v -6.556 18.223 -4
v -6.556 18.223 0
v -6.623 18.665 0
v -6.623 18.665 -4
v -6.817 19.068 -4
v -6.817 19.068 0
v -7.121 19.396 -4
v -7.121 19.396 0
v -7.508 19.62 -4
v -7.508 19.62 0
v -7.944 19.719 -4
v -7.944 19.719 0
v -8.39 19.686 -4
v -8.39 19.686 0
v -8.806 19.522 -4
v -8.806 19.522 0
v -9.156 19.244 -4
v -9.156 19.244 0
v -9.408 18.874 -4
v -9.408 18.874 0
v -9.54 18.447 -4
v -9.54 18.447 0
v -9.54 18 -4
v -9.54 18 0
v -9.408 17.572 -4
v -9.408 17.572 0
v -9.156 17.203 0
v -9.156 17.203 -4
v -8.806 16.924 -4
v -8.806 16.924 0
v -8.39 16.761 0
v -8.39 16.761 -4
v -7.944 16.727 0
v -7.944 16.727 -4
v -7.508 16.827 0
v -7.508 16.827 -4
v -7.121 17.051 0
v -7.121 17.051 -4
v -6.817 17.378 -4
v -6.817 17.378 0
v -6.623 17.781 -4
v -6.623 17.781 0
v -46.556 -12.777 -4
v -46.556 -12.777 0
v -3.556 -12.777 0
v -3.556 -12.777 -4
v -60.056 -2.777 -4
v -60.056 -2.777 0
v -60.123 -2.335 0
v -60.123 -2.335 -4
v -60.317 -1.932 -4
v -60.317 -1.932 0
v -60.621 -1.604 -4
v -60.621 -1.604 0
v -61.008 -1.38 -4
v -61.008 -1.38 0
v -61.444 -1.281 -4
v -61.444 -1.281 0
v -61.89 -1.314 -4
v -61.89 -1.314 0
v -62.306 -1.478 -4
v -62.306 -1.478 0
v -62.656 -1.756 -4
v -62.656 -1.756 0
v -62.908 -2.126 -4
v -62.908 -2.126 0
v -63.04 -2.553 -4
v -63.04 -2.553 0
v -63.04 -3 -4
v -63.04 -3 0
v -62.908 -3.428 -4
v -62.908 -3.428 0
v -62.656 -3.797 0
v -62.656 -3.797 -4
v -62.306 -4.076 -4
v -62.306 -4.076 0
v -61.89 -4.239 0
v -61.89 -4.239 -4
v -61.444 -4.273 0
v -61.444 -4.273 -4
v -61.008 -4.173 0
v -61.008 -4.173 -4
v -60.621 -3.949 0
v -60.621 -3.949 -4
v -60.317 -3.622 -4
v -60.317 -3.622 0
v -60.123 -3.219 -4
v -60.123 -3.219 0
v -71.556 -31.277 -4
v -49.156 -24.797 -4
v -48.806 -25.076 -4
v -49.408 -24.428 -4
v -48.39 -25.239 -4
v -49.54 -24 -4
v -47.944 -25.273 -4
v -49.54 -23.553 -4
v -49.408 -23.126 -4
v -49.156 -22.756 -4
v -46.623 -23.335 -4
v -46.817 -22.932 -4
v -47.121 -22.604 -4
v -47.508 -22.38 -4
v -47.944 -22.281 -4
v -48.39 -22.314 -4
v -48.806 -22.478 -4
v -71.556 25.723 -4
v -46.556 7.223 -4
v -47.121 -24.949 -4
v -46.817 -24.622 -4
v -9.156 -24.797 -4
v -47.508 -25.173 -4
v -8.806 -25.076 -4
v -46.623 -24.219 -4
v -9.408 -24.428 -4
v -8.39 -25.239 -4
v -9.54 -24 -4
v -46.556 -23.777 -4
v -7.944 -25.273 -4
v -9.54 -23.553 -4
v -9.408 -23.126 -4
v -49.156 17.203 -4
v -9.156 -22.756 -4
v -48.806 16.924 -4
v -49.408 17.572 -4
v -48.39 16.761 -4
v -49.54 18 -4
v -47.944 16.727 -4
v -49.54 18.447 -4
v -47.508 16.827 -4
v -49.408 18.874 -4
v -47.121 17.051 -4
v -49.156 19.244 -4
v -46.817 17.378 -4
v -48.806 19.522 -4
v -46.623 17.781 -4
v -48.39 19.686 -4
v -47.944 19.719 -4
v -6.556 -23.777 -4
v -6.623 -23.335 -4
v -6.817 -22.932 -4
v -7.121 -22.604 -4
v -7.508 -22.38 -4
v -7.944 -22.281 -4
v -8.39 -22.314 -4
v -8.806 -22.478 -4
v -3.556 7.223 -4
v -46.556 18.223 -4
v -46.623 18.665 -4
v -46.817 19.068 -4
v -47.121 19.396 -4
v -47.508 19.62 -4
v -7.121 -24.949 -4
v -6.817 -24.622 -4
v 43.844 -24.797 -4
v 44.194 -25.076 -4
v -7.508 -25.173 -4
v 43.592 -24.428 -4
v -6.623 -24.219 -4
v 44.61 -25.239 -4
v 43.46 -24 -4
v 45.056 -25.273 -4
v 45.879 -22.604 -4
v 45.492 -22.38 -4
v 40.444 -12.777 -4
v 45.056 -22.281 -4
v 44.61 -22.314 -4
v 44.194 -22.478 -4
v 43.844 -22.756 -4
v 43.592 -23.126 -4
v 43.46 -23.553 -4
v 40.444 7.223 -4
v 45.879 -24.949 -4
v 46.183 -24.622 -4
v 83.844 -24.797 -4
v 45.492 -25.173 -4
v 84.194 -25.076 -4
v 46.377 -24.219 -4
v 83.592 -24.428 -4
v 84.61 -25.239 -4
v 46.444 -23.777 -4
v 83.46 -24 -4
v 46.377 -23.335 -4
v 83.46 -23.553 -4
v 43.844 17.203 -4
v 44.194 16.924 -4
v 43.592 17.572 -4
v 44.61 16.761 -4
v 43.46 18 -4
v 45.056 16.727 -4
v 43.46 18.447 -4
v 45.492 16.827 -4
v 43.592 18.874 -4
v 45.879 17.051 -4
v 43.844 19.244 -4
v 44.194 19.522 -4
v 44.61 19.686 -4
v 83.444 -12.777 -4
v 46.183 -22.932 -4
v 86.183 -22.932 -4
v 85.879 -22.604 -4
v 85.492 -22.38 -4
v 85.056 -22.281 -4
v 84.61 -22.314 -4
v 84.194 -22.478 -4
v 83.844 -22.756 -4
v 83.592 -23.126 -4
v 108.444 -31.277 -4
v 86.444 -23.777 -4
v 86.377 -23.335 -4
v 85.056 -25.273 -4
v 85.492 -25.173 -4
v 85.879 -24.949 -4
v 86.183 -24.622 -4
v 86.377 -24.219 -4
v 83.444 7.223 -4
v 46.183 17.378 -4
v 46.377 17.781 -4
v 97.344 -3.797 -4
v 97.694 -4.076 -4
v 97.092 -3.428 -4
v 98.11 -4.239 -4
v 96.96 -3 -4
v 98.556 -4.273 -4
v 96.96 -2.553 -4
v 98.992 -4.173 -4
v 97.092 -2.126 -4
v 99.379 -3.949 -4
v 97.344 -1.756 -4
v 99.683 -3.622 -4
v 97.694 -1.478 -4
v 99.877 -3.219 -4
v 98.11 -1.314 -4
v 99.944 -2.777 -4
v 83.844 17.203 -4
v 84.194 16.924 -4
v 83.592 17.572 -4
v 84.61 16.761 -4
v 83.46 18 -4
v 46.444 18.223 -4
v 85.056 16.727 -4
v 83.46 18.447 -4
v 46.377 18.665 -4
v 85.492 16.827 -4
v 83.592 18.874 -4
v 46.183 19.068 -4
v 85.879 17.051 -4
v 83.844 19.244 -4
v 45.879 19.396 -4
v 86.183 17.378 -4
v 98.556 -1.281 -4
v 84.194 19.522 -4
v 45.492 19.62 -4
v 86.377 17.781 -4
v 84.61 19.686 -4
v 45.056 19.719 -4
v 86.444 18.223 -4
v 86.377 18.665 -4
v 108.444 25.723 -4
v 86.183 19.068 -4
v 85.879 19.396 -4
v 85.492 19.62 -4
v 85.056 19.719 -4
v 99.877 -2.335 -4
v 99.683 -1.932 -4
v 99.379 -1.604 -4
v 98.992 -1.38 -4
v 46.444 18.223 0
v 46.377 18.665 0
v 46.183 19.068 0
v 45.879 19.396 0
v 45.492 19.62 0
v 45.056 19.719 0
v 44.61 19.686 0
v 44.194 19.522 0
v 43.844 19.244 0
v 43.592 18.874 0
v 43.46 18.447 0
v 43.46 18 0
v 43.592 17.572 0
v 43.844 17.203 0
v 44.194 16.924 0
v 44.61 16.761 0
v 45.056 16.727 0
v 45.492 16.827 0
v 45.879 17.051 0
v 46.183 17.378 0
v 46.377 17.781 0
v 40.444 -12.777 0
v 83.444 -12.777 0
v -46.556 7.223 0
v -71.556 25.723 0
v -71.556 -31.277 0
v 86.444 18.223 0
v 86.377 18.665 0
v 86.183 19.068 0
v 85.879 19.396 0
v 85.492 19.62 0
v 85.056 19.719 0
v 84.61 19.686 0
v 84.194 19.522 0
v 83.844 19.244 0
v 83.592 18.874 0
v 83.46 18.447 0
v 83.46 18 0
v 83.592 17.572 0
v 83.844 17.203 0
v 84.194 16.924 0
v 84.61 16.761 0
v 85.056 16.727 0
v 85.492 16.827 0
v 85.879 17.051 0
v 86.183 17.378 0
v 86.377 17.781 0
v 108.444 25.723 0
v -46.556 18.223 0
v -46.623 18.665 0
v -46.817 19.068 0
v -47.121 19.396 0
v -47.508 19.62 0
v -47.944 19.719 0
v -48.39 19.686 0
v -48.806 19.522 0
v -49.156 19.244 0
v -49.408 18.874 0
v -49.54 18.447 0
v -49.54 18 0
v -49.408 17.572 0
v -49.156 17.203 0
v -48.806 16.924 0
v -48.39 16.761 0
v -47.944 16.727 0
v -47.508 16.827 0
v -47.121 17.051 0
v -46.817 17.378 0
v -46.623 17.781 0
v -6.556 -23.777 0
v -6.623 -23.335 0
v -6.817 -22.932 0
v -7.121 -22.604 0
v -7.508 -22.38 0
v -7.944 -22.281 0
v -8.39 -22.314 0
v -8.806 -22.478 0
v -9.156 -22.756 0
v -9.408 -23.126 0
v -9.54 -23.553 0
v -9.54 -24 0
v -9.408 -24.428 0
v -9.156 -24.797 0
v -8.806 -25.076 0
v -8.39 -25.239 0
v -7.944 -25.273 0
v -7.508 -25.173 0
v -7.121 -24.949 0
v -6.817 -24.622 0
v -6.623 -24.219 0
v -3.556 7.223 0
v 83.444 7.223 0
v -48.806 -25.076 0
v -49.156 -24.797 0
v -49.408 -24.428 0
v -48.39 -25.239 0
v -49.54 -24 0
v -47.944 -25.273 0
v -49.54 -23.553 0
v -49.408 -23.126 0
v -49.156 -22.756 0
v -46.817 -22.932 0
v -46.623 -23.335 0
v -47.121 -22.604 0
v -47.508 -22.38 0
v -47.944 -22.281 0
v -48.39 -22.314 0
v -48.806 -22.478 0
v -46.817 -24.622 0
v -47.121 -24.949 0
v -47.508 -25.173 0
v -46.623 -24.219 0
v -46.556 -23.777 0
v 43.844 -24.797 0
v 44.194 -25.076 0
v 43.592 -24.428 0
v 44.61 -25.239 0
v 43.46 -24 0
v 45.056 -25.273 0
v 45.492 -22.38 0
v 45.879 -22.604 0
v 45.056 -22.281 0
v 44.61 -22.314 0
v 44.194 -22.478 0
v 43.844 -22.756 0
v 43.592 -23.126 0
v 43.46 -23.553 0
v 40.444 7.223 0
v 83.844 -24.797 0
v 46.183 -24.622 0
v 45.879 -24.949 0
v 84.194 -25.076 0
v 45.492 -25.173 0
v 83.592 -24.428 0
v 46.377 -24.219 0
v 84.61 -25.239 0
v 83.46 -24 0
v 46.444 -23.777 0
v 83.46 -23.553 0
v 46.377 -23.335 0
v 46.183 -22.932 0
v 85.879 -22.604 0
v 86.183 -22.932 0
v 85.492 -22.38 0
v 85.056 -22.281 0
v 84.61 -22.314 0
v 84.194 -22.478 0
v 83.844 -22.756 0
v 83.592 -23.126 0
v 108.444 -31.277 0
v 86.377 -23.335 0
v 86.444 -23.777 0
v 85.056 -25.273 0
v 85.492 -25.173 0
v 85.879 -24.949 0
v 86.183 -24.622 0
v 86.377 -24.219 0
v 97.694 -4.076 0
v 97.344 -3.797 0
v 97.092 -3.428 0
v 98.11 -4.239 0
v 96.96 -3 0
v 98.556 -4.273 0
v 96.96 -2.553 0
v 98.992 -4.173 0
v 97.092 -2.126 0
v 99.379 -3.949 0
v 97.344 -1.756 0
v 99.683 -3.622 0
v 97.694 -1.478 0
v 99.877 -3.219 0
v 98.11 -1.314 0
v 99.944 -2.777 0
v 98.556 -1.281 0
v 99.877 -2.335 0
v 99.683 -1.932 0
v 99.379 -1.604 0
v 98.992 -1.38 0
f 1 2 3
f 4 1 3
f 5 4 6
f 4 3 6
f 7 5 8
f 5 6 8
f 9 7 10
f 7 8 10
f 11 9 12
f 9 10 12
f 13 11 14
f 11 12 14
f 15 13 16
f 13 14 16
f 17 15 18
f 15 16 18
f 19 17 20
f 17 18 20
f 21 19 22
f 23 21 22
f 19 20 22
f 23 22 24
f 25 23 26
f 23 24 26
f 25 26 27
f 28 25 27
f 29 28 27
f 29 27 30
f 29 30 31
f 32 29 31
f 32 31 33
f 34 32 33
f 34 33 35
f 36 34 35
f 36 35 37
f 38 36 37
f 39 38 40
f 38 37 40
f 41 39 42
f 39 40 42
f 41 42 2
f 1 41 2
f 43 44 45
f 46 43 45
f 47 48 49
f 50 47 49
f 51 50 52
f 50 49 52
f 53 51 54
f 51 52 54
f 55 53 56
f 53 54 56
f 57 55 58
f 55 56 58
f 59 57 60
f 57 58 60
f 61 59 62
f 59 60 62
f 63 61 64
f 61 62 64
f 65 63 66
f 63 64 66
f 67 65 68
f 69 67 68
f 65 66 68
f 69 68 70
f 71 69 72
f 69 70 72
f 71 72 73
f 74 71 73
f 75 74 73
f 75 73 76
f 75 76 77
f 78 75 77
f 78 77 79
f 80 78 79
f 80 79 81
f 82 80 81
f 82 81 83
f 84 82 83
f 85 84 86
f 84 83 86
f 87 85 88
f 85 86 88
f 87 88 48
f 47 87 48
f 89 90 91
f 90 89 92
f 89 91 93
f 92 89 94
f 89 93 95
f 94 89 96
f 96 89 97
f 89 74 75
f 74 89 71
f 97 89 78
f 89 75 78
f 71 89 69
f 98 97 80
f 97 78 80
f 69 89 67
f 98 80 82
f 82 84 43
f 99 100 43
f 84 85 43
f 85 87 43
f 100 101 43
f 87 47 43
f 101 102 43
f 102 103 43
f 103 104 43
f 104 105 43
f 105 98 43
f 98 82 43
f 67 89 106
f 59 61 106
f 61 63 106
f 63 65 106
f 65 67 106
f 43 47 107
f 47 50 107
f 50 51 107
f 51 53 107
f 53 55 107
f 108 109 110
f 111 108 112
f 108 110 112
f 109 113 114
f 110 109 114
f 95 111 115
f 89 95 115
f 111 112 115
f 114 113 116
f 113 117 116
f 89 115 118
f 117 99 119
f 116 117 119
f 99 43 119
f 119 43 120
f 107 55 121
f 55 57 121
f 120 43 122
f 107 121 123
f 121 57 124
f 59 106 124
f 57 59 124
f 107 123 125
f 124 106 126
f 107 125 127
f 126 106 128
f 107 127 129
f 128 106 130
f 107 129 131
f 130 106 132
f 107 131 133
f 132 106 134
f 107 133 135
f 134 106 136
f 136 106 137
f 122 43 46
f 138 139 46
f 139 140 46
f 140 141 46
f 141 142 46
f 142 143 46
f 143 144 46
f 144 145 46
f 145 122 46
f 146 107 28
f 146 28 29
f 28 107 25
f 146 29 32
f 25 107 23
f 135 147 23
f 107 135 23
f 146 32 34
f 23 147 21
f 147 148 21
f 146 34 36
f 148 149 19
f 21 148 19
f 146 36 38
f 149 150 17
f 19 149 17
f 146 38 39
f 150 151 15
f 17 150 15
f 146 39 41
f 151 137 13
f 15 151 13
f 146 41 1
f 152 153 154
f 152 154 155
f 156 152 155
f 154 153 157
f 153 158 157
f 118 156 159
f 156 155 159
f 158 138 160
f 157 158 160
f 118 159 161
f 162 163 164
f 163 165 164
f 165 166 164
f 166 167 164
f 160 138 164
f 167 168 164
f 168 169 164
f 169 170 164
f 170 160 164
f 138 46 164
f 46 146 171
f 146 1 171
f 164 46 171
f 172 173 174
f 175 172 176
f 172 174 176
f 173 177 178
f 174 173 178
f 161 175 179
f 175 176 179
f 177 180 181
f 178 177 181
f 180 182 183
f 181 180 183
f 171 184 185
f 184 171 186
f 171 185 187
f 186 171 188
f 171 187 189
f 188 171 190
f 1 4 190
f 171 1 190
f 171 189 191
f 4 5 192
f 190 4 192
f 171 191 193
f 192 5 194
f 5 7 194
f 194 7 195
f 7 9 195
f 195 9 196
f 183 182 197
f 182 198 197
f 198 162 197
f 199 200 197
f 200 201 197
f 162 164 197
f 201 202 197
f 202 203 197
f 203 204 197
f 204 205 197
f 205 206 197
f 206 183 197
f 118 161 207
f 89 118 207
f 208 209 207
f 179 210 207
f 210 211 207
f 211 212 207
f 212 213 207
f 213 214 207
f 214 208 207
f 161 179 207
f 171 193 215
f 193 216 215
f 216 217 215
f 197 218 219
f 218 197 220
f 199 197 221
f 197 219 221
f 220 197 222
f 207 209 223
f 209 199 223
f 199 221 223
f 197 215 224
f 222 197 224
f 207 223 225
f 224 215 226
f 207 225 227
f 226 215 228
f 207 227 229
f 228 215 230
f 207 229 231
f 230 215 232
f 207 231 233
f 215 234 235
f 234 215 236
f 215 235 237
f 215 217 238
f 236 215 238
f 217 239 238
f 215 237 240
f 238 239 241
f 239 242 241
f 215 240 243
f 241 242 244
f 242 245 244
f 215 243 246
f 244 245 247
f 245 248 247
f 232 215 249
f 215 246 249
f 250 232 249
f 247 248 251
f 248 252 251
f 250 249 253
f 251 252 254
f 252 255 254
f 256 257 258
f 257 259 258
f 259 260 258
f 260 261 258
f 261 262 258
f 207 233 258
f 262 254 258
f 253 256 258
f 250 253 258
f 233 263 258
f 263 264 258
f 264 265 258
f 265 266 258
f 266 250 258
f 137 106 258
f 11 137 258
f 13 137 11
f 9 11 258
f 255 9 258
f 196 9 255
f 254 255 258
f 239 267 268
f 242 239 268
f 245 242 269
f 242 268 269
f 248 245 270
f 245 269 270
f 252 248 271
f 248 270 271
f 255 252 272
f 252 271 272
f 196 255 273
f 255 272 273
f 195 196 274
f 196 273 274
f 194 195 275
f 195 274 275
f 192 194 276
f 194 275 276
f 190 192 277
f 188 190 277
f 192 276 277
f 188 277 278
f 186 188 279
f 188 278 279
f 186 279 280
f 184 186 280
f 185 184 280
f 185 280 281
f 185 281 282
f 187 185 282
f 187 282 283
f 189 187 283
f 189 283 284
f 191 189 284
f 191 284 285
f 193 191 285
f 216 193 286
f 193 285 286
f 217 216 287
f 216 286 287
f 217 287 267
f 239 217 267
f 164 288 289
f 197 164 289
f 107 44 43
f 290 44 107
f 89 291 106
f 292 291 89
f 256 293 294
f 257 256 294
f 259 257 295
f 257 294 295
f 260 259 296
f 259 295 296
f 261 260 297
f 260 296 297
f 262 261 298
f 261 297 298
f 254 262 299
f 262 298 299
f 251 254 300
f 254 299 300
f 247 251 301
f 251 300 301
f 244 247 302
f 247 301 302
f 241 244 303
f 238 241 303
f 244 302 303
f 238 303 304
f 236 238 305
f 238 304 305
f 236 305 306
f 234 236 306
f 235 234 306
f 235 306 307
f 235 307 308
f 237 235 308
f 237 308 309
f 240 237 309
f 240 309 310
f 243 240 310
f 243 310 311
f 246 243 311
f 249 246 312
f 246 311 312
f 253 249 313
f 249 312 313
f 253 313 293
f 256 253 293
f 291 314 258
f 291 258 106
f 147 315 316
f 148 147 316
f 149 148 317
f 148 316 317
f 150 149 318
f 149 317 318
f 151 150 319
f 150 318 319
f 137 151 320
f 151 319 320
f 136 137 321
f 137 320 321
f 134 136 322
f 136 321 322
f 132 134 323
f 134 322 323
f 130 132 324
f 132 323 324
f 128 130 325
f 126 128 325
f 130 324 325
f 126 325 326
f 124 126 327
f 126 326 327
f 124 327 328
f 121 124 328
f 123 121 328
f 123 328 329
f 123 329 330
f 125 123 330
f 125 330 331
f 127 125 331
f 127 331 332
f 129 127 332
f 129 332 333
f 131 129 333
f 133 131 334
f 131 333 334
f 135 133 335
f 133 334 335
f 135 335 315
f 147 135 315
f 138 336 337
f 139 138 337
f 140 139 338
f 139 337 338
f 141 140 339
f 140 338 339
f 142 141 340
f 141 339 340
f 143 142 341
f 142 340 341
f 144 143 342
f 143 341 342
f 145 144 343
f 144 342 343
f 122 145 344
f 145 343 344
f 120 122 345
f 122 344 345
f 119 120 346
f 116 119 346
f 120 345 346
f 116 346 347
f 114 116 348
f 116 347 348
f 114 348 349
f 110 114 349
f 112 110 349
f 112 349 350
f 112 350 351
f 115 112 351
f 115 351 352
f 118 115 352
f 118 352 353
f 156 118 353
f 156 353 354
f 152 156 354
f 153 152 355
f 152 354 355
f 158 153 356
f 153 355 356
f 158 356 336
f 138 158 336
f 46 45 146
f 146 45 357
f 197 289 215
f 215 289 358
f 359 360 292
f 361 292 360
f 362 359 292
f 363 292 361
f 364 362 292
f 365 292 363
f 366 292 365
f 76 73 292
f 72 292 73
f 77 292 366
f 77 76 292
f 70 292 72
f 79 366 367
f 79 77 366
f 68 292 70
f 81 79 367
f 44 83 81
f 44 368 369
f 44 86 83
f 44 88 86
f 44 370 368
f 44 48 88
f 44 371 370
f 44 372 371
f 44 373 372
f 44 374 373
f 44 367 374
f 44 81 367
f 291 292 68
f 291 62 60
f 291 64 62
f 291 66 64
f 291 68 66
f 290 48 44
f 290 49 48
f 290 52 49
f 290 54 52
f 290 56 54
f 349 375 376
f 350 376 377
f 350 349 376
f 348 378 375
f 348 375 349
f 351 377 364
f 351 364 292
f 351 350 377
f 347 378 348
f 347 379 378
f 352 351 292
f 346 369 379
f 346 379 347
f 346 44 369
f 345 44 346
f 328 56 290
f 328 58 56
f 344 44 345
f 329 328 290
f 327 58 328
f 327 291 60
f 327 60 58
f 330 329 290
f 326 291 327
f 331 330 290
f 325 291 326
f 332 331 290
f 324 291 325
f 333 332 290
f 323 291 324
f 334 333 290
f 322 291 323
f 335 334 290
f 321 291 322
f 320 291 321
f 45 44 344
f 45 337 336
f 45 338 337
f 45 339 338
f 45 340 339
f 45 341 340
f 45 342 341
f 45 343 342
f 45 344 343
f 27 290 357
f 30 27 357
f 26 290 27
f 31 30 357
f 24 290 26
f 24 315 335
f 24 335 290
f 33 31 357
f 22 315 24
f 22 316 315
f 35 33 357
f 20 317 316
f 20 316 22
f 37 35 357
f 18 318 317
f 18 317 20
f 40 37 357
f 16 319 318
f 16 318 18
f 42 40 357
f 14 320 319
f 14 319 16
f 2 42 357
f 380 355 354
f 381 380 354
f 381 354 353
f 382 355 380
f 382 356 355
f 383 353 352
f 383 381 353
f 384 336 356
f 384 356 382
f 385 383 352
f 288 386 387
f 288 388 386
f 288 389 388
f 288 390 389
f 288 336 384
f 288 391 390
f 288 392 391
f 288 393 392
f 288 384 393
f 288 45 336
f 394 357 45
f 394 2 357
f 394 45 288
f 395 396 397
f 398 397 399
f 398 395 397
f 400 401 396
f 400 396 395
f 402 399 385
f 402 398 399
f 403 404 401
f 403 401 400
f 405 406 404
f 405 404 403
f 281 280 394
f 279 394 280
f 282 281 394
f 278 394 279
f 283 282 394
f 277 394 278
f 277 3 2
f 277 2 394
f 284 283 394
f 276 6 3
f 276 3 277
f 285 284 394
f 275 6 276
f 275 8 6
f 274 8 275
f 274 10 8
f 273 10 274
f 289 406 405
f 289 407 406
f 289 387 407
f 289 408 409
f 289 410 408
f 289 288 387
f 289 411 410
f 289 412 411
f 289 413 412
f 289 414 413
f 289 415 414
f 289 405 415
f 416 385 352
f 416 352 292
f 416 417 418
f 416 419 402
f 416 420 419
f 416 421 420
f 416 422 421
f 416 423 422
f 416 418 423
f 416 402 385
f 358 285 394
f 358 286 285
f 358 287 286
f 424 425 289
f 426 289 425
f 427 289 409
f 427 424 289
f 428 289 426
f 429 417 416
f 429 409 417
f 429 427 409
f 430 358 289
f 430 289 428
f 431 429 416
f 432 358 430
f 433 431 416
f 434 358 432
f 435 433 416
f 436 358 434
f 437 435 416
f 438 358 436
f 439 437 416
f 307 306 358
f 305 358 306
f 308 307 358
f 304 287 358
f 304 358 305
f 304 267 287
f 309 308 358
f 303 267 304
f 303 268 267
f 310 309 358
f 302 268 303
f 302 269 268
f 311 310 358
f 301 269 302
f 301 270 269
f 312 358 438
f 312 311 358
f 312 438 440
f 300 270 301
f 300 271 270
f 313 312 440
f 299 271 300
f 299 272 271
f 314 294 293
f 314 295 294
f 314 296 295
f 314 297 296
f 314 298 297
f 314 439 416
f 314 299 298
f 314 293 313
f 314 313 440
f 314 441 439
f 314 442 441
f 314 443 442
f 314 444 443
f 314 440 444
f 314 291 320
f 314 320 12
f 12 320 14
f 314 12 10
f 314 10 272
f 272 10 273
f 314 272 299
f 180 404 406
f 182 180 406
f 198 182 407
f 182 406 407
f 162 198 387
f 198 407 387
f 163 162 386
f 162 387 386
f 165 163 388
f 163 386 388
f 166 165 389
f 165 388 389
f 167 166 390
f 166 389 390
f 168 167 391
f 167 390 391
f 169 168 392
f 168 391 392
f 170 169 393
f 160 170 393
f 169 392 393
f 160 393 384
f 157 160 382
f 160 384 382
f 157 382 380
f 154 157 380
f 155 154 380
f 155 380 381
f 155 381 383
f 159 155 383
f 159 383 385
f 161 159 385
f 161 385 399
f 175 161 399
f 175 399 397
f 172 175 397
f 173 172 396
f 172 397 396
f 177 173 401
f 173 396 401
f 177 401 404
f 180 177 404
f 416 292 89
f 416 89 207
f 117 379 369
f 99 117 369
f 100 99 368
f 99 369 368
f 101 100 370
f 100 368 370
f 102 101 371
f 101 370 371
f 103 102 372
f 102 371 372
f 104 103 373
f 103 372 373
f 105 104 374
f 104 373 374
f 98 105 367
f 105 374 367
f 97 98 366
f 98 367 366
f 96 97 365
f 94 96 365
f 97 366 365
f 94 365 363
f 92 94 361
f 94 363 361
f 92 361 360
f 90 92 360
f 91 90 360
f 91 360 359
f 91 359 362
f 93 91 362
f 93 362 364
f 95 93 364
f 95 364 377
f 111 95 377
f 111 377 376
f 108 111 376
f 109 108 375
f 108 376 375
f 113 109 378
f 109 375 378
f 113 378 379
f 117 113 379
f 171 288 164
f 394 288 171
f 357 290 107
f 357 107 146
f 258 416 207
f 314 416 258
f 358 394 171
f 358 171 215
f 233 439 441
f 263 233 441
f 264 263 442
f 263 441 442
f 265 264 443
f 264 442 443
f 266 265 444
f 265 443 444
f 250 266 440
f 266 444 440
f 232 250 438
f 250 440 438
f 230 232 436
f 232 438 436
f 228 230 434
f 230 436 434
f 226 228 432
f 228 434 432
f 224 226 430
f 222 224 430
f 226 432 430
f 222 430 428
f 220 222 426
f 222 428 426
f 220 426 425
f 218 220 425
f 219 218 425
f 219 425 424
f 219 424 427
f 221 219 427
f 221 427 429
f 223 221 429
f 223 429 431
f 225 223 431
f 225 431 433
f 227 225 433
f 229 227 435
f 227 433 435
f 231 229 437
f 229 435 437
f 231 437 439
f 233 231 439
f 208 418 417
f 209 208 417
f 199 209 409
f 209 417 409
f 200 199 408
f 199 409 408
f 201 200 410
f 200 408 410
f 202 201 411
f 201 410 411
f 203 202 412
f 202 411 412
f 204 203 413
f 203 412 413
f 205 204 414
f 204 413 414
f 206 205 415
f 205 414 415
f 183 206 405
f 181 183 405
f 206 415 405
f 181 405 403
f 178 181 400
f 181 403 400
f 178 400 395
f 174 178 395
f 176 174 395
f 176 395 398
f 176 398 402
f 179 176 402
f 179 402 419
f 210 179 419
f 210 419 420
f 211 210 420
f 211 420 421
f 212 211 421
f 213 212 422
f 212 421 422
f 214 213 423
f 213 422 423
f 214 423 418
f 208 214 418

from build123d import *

# Parameters (mm, degrees)
SKETCH1_R           = 1.5
SKETCH1_W           = 43
SKETCH1_H           = 20
BOSS_EXTRUDE3_DEPTH = 4


with BuildPart() as part:
    # Sketch1 → Boss-Extrude3 (new body)
    with BuildSketch(Plane.XY):
        Polygon((8.44359092, 25.723284589), (-71.55640908, 25.723284589), (-71.55640908, -31.276715411), (8.44359092, -31.276715411), (28.44359092, -31.276715411), (108.44359092, -31.276715411), (108.44359092, 25.723284589), (28.44359092, 25.723284589), align=None)
        with Locations((-48.05640908, -23.776715411)):
            Circle(SKETCH1_R, mode=Mode.SUBTRACT)
        with Locations((-8.05640908, -23.776715411)):
            Circle(SKETCH1_R, mode=Mode.SUBTRACT)
        with Locations((-61.55640908, -2.776715411)):
            Circle(SKETCH1_R, mode=Mode.SUBTRACT)
        with Locations((-25.05640908, -2.776715411)):
            Rectangle(SKETCH1_W, SKETCH1_H, mode=Mode.SUBTRACT)
        with Locations((44.94359092, -23.776715411)):
            Circle(SKETCH1_R, mode=Mode.SUBTRACT)
        with Locations((84.94359092, -23.776715411)):
            Circle(SKETCH1_R, mode=Mode.SUBTRACT)
        with Locations((61.94359092, -2.776715411)):
            Rectangle(SKETCH1_W, SKETCH1_H, mode=Mode.SUBTRACT)
        with Locations((98.44359092, -2.776715411)):
            Circle(SKETCH1_R, mode=Mode.SUBTRACT)
        with Locations((-48.05640908, 18.223284589)):
            Circle(SKETCH1_R, mode=Mode.SUBTRACT)
        with Locations((-8.05640908, 18.223284589)):
            Circle(SKETCH1_R, mode=Mode.SUBTRACT)
        with Locations((44.94359092, 18.223284589)):
            Circle(SKETCH1_R, mode=Mode.SUBTRACT)
        with Locations((84.94359092, 18.223284589)):
            Circle(SKETCH1_R, mode=Mode.SUBTRACT)
    extrude(amount=-BOSS_EXTRUDE3_DEPTH)


solid = part.part
